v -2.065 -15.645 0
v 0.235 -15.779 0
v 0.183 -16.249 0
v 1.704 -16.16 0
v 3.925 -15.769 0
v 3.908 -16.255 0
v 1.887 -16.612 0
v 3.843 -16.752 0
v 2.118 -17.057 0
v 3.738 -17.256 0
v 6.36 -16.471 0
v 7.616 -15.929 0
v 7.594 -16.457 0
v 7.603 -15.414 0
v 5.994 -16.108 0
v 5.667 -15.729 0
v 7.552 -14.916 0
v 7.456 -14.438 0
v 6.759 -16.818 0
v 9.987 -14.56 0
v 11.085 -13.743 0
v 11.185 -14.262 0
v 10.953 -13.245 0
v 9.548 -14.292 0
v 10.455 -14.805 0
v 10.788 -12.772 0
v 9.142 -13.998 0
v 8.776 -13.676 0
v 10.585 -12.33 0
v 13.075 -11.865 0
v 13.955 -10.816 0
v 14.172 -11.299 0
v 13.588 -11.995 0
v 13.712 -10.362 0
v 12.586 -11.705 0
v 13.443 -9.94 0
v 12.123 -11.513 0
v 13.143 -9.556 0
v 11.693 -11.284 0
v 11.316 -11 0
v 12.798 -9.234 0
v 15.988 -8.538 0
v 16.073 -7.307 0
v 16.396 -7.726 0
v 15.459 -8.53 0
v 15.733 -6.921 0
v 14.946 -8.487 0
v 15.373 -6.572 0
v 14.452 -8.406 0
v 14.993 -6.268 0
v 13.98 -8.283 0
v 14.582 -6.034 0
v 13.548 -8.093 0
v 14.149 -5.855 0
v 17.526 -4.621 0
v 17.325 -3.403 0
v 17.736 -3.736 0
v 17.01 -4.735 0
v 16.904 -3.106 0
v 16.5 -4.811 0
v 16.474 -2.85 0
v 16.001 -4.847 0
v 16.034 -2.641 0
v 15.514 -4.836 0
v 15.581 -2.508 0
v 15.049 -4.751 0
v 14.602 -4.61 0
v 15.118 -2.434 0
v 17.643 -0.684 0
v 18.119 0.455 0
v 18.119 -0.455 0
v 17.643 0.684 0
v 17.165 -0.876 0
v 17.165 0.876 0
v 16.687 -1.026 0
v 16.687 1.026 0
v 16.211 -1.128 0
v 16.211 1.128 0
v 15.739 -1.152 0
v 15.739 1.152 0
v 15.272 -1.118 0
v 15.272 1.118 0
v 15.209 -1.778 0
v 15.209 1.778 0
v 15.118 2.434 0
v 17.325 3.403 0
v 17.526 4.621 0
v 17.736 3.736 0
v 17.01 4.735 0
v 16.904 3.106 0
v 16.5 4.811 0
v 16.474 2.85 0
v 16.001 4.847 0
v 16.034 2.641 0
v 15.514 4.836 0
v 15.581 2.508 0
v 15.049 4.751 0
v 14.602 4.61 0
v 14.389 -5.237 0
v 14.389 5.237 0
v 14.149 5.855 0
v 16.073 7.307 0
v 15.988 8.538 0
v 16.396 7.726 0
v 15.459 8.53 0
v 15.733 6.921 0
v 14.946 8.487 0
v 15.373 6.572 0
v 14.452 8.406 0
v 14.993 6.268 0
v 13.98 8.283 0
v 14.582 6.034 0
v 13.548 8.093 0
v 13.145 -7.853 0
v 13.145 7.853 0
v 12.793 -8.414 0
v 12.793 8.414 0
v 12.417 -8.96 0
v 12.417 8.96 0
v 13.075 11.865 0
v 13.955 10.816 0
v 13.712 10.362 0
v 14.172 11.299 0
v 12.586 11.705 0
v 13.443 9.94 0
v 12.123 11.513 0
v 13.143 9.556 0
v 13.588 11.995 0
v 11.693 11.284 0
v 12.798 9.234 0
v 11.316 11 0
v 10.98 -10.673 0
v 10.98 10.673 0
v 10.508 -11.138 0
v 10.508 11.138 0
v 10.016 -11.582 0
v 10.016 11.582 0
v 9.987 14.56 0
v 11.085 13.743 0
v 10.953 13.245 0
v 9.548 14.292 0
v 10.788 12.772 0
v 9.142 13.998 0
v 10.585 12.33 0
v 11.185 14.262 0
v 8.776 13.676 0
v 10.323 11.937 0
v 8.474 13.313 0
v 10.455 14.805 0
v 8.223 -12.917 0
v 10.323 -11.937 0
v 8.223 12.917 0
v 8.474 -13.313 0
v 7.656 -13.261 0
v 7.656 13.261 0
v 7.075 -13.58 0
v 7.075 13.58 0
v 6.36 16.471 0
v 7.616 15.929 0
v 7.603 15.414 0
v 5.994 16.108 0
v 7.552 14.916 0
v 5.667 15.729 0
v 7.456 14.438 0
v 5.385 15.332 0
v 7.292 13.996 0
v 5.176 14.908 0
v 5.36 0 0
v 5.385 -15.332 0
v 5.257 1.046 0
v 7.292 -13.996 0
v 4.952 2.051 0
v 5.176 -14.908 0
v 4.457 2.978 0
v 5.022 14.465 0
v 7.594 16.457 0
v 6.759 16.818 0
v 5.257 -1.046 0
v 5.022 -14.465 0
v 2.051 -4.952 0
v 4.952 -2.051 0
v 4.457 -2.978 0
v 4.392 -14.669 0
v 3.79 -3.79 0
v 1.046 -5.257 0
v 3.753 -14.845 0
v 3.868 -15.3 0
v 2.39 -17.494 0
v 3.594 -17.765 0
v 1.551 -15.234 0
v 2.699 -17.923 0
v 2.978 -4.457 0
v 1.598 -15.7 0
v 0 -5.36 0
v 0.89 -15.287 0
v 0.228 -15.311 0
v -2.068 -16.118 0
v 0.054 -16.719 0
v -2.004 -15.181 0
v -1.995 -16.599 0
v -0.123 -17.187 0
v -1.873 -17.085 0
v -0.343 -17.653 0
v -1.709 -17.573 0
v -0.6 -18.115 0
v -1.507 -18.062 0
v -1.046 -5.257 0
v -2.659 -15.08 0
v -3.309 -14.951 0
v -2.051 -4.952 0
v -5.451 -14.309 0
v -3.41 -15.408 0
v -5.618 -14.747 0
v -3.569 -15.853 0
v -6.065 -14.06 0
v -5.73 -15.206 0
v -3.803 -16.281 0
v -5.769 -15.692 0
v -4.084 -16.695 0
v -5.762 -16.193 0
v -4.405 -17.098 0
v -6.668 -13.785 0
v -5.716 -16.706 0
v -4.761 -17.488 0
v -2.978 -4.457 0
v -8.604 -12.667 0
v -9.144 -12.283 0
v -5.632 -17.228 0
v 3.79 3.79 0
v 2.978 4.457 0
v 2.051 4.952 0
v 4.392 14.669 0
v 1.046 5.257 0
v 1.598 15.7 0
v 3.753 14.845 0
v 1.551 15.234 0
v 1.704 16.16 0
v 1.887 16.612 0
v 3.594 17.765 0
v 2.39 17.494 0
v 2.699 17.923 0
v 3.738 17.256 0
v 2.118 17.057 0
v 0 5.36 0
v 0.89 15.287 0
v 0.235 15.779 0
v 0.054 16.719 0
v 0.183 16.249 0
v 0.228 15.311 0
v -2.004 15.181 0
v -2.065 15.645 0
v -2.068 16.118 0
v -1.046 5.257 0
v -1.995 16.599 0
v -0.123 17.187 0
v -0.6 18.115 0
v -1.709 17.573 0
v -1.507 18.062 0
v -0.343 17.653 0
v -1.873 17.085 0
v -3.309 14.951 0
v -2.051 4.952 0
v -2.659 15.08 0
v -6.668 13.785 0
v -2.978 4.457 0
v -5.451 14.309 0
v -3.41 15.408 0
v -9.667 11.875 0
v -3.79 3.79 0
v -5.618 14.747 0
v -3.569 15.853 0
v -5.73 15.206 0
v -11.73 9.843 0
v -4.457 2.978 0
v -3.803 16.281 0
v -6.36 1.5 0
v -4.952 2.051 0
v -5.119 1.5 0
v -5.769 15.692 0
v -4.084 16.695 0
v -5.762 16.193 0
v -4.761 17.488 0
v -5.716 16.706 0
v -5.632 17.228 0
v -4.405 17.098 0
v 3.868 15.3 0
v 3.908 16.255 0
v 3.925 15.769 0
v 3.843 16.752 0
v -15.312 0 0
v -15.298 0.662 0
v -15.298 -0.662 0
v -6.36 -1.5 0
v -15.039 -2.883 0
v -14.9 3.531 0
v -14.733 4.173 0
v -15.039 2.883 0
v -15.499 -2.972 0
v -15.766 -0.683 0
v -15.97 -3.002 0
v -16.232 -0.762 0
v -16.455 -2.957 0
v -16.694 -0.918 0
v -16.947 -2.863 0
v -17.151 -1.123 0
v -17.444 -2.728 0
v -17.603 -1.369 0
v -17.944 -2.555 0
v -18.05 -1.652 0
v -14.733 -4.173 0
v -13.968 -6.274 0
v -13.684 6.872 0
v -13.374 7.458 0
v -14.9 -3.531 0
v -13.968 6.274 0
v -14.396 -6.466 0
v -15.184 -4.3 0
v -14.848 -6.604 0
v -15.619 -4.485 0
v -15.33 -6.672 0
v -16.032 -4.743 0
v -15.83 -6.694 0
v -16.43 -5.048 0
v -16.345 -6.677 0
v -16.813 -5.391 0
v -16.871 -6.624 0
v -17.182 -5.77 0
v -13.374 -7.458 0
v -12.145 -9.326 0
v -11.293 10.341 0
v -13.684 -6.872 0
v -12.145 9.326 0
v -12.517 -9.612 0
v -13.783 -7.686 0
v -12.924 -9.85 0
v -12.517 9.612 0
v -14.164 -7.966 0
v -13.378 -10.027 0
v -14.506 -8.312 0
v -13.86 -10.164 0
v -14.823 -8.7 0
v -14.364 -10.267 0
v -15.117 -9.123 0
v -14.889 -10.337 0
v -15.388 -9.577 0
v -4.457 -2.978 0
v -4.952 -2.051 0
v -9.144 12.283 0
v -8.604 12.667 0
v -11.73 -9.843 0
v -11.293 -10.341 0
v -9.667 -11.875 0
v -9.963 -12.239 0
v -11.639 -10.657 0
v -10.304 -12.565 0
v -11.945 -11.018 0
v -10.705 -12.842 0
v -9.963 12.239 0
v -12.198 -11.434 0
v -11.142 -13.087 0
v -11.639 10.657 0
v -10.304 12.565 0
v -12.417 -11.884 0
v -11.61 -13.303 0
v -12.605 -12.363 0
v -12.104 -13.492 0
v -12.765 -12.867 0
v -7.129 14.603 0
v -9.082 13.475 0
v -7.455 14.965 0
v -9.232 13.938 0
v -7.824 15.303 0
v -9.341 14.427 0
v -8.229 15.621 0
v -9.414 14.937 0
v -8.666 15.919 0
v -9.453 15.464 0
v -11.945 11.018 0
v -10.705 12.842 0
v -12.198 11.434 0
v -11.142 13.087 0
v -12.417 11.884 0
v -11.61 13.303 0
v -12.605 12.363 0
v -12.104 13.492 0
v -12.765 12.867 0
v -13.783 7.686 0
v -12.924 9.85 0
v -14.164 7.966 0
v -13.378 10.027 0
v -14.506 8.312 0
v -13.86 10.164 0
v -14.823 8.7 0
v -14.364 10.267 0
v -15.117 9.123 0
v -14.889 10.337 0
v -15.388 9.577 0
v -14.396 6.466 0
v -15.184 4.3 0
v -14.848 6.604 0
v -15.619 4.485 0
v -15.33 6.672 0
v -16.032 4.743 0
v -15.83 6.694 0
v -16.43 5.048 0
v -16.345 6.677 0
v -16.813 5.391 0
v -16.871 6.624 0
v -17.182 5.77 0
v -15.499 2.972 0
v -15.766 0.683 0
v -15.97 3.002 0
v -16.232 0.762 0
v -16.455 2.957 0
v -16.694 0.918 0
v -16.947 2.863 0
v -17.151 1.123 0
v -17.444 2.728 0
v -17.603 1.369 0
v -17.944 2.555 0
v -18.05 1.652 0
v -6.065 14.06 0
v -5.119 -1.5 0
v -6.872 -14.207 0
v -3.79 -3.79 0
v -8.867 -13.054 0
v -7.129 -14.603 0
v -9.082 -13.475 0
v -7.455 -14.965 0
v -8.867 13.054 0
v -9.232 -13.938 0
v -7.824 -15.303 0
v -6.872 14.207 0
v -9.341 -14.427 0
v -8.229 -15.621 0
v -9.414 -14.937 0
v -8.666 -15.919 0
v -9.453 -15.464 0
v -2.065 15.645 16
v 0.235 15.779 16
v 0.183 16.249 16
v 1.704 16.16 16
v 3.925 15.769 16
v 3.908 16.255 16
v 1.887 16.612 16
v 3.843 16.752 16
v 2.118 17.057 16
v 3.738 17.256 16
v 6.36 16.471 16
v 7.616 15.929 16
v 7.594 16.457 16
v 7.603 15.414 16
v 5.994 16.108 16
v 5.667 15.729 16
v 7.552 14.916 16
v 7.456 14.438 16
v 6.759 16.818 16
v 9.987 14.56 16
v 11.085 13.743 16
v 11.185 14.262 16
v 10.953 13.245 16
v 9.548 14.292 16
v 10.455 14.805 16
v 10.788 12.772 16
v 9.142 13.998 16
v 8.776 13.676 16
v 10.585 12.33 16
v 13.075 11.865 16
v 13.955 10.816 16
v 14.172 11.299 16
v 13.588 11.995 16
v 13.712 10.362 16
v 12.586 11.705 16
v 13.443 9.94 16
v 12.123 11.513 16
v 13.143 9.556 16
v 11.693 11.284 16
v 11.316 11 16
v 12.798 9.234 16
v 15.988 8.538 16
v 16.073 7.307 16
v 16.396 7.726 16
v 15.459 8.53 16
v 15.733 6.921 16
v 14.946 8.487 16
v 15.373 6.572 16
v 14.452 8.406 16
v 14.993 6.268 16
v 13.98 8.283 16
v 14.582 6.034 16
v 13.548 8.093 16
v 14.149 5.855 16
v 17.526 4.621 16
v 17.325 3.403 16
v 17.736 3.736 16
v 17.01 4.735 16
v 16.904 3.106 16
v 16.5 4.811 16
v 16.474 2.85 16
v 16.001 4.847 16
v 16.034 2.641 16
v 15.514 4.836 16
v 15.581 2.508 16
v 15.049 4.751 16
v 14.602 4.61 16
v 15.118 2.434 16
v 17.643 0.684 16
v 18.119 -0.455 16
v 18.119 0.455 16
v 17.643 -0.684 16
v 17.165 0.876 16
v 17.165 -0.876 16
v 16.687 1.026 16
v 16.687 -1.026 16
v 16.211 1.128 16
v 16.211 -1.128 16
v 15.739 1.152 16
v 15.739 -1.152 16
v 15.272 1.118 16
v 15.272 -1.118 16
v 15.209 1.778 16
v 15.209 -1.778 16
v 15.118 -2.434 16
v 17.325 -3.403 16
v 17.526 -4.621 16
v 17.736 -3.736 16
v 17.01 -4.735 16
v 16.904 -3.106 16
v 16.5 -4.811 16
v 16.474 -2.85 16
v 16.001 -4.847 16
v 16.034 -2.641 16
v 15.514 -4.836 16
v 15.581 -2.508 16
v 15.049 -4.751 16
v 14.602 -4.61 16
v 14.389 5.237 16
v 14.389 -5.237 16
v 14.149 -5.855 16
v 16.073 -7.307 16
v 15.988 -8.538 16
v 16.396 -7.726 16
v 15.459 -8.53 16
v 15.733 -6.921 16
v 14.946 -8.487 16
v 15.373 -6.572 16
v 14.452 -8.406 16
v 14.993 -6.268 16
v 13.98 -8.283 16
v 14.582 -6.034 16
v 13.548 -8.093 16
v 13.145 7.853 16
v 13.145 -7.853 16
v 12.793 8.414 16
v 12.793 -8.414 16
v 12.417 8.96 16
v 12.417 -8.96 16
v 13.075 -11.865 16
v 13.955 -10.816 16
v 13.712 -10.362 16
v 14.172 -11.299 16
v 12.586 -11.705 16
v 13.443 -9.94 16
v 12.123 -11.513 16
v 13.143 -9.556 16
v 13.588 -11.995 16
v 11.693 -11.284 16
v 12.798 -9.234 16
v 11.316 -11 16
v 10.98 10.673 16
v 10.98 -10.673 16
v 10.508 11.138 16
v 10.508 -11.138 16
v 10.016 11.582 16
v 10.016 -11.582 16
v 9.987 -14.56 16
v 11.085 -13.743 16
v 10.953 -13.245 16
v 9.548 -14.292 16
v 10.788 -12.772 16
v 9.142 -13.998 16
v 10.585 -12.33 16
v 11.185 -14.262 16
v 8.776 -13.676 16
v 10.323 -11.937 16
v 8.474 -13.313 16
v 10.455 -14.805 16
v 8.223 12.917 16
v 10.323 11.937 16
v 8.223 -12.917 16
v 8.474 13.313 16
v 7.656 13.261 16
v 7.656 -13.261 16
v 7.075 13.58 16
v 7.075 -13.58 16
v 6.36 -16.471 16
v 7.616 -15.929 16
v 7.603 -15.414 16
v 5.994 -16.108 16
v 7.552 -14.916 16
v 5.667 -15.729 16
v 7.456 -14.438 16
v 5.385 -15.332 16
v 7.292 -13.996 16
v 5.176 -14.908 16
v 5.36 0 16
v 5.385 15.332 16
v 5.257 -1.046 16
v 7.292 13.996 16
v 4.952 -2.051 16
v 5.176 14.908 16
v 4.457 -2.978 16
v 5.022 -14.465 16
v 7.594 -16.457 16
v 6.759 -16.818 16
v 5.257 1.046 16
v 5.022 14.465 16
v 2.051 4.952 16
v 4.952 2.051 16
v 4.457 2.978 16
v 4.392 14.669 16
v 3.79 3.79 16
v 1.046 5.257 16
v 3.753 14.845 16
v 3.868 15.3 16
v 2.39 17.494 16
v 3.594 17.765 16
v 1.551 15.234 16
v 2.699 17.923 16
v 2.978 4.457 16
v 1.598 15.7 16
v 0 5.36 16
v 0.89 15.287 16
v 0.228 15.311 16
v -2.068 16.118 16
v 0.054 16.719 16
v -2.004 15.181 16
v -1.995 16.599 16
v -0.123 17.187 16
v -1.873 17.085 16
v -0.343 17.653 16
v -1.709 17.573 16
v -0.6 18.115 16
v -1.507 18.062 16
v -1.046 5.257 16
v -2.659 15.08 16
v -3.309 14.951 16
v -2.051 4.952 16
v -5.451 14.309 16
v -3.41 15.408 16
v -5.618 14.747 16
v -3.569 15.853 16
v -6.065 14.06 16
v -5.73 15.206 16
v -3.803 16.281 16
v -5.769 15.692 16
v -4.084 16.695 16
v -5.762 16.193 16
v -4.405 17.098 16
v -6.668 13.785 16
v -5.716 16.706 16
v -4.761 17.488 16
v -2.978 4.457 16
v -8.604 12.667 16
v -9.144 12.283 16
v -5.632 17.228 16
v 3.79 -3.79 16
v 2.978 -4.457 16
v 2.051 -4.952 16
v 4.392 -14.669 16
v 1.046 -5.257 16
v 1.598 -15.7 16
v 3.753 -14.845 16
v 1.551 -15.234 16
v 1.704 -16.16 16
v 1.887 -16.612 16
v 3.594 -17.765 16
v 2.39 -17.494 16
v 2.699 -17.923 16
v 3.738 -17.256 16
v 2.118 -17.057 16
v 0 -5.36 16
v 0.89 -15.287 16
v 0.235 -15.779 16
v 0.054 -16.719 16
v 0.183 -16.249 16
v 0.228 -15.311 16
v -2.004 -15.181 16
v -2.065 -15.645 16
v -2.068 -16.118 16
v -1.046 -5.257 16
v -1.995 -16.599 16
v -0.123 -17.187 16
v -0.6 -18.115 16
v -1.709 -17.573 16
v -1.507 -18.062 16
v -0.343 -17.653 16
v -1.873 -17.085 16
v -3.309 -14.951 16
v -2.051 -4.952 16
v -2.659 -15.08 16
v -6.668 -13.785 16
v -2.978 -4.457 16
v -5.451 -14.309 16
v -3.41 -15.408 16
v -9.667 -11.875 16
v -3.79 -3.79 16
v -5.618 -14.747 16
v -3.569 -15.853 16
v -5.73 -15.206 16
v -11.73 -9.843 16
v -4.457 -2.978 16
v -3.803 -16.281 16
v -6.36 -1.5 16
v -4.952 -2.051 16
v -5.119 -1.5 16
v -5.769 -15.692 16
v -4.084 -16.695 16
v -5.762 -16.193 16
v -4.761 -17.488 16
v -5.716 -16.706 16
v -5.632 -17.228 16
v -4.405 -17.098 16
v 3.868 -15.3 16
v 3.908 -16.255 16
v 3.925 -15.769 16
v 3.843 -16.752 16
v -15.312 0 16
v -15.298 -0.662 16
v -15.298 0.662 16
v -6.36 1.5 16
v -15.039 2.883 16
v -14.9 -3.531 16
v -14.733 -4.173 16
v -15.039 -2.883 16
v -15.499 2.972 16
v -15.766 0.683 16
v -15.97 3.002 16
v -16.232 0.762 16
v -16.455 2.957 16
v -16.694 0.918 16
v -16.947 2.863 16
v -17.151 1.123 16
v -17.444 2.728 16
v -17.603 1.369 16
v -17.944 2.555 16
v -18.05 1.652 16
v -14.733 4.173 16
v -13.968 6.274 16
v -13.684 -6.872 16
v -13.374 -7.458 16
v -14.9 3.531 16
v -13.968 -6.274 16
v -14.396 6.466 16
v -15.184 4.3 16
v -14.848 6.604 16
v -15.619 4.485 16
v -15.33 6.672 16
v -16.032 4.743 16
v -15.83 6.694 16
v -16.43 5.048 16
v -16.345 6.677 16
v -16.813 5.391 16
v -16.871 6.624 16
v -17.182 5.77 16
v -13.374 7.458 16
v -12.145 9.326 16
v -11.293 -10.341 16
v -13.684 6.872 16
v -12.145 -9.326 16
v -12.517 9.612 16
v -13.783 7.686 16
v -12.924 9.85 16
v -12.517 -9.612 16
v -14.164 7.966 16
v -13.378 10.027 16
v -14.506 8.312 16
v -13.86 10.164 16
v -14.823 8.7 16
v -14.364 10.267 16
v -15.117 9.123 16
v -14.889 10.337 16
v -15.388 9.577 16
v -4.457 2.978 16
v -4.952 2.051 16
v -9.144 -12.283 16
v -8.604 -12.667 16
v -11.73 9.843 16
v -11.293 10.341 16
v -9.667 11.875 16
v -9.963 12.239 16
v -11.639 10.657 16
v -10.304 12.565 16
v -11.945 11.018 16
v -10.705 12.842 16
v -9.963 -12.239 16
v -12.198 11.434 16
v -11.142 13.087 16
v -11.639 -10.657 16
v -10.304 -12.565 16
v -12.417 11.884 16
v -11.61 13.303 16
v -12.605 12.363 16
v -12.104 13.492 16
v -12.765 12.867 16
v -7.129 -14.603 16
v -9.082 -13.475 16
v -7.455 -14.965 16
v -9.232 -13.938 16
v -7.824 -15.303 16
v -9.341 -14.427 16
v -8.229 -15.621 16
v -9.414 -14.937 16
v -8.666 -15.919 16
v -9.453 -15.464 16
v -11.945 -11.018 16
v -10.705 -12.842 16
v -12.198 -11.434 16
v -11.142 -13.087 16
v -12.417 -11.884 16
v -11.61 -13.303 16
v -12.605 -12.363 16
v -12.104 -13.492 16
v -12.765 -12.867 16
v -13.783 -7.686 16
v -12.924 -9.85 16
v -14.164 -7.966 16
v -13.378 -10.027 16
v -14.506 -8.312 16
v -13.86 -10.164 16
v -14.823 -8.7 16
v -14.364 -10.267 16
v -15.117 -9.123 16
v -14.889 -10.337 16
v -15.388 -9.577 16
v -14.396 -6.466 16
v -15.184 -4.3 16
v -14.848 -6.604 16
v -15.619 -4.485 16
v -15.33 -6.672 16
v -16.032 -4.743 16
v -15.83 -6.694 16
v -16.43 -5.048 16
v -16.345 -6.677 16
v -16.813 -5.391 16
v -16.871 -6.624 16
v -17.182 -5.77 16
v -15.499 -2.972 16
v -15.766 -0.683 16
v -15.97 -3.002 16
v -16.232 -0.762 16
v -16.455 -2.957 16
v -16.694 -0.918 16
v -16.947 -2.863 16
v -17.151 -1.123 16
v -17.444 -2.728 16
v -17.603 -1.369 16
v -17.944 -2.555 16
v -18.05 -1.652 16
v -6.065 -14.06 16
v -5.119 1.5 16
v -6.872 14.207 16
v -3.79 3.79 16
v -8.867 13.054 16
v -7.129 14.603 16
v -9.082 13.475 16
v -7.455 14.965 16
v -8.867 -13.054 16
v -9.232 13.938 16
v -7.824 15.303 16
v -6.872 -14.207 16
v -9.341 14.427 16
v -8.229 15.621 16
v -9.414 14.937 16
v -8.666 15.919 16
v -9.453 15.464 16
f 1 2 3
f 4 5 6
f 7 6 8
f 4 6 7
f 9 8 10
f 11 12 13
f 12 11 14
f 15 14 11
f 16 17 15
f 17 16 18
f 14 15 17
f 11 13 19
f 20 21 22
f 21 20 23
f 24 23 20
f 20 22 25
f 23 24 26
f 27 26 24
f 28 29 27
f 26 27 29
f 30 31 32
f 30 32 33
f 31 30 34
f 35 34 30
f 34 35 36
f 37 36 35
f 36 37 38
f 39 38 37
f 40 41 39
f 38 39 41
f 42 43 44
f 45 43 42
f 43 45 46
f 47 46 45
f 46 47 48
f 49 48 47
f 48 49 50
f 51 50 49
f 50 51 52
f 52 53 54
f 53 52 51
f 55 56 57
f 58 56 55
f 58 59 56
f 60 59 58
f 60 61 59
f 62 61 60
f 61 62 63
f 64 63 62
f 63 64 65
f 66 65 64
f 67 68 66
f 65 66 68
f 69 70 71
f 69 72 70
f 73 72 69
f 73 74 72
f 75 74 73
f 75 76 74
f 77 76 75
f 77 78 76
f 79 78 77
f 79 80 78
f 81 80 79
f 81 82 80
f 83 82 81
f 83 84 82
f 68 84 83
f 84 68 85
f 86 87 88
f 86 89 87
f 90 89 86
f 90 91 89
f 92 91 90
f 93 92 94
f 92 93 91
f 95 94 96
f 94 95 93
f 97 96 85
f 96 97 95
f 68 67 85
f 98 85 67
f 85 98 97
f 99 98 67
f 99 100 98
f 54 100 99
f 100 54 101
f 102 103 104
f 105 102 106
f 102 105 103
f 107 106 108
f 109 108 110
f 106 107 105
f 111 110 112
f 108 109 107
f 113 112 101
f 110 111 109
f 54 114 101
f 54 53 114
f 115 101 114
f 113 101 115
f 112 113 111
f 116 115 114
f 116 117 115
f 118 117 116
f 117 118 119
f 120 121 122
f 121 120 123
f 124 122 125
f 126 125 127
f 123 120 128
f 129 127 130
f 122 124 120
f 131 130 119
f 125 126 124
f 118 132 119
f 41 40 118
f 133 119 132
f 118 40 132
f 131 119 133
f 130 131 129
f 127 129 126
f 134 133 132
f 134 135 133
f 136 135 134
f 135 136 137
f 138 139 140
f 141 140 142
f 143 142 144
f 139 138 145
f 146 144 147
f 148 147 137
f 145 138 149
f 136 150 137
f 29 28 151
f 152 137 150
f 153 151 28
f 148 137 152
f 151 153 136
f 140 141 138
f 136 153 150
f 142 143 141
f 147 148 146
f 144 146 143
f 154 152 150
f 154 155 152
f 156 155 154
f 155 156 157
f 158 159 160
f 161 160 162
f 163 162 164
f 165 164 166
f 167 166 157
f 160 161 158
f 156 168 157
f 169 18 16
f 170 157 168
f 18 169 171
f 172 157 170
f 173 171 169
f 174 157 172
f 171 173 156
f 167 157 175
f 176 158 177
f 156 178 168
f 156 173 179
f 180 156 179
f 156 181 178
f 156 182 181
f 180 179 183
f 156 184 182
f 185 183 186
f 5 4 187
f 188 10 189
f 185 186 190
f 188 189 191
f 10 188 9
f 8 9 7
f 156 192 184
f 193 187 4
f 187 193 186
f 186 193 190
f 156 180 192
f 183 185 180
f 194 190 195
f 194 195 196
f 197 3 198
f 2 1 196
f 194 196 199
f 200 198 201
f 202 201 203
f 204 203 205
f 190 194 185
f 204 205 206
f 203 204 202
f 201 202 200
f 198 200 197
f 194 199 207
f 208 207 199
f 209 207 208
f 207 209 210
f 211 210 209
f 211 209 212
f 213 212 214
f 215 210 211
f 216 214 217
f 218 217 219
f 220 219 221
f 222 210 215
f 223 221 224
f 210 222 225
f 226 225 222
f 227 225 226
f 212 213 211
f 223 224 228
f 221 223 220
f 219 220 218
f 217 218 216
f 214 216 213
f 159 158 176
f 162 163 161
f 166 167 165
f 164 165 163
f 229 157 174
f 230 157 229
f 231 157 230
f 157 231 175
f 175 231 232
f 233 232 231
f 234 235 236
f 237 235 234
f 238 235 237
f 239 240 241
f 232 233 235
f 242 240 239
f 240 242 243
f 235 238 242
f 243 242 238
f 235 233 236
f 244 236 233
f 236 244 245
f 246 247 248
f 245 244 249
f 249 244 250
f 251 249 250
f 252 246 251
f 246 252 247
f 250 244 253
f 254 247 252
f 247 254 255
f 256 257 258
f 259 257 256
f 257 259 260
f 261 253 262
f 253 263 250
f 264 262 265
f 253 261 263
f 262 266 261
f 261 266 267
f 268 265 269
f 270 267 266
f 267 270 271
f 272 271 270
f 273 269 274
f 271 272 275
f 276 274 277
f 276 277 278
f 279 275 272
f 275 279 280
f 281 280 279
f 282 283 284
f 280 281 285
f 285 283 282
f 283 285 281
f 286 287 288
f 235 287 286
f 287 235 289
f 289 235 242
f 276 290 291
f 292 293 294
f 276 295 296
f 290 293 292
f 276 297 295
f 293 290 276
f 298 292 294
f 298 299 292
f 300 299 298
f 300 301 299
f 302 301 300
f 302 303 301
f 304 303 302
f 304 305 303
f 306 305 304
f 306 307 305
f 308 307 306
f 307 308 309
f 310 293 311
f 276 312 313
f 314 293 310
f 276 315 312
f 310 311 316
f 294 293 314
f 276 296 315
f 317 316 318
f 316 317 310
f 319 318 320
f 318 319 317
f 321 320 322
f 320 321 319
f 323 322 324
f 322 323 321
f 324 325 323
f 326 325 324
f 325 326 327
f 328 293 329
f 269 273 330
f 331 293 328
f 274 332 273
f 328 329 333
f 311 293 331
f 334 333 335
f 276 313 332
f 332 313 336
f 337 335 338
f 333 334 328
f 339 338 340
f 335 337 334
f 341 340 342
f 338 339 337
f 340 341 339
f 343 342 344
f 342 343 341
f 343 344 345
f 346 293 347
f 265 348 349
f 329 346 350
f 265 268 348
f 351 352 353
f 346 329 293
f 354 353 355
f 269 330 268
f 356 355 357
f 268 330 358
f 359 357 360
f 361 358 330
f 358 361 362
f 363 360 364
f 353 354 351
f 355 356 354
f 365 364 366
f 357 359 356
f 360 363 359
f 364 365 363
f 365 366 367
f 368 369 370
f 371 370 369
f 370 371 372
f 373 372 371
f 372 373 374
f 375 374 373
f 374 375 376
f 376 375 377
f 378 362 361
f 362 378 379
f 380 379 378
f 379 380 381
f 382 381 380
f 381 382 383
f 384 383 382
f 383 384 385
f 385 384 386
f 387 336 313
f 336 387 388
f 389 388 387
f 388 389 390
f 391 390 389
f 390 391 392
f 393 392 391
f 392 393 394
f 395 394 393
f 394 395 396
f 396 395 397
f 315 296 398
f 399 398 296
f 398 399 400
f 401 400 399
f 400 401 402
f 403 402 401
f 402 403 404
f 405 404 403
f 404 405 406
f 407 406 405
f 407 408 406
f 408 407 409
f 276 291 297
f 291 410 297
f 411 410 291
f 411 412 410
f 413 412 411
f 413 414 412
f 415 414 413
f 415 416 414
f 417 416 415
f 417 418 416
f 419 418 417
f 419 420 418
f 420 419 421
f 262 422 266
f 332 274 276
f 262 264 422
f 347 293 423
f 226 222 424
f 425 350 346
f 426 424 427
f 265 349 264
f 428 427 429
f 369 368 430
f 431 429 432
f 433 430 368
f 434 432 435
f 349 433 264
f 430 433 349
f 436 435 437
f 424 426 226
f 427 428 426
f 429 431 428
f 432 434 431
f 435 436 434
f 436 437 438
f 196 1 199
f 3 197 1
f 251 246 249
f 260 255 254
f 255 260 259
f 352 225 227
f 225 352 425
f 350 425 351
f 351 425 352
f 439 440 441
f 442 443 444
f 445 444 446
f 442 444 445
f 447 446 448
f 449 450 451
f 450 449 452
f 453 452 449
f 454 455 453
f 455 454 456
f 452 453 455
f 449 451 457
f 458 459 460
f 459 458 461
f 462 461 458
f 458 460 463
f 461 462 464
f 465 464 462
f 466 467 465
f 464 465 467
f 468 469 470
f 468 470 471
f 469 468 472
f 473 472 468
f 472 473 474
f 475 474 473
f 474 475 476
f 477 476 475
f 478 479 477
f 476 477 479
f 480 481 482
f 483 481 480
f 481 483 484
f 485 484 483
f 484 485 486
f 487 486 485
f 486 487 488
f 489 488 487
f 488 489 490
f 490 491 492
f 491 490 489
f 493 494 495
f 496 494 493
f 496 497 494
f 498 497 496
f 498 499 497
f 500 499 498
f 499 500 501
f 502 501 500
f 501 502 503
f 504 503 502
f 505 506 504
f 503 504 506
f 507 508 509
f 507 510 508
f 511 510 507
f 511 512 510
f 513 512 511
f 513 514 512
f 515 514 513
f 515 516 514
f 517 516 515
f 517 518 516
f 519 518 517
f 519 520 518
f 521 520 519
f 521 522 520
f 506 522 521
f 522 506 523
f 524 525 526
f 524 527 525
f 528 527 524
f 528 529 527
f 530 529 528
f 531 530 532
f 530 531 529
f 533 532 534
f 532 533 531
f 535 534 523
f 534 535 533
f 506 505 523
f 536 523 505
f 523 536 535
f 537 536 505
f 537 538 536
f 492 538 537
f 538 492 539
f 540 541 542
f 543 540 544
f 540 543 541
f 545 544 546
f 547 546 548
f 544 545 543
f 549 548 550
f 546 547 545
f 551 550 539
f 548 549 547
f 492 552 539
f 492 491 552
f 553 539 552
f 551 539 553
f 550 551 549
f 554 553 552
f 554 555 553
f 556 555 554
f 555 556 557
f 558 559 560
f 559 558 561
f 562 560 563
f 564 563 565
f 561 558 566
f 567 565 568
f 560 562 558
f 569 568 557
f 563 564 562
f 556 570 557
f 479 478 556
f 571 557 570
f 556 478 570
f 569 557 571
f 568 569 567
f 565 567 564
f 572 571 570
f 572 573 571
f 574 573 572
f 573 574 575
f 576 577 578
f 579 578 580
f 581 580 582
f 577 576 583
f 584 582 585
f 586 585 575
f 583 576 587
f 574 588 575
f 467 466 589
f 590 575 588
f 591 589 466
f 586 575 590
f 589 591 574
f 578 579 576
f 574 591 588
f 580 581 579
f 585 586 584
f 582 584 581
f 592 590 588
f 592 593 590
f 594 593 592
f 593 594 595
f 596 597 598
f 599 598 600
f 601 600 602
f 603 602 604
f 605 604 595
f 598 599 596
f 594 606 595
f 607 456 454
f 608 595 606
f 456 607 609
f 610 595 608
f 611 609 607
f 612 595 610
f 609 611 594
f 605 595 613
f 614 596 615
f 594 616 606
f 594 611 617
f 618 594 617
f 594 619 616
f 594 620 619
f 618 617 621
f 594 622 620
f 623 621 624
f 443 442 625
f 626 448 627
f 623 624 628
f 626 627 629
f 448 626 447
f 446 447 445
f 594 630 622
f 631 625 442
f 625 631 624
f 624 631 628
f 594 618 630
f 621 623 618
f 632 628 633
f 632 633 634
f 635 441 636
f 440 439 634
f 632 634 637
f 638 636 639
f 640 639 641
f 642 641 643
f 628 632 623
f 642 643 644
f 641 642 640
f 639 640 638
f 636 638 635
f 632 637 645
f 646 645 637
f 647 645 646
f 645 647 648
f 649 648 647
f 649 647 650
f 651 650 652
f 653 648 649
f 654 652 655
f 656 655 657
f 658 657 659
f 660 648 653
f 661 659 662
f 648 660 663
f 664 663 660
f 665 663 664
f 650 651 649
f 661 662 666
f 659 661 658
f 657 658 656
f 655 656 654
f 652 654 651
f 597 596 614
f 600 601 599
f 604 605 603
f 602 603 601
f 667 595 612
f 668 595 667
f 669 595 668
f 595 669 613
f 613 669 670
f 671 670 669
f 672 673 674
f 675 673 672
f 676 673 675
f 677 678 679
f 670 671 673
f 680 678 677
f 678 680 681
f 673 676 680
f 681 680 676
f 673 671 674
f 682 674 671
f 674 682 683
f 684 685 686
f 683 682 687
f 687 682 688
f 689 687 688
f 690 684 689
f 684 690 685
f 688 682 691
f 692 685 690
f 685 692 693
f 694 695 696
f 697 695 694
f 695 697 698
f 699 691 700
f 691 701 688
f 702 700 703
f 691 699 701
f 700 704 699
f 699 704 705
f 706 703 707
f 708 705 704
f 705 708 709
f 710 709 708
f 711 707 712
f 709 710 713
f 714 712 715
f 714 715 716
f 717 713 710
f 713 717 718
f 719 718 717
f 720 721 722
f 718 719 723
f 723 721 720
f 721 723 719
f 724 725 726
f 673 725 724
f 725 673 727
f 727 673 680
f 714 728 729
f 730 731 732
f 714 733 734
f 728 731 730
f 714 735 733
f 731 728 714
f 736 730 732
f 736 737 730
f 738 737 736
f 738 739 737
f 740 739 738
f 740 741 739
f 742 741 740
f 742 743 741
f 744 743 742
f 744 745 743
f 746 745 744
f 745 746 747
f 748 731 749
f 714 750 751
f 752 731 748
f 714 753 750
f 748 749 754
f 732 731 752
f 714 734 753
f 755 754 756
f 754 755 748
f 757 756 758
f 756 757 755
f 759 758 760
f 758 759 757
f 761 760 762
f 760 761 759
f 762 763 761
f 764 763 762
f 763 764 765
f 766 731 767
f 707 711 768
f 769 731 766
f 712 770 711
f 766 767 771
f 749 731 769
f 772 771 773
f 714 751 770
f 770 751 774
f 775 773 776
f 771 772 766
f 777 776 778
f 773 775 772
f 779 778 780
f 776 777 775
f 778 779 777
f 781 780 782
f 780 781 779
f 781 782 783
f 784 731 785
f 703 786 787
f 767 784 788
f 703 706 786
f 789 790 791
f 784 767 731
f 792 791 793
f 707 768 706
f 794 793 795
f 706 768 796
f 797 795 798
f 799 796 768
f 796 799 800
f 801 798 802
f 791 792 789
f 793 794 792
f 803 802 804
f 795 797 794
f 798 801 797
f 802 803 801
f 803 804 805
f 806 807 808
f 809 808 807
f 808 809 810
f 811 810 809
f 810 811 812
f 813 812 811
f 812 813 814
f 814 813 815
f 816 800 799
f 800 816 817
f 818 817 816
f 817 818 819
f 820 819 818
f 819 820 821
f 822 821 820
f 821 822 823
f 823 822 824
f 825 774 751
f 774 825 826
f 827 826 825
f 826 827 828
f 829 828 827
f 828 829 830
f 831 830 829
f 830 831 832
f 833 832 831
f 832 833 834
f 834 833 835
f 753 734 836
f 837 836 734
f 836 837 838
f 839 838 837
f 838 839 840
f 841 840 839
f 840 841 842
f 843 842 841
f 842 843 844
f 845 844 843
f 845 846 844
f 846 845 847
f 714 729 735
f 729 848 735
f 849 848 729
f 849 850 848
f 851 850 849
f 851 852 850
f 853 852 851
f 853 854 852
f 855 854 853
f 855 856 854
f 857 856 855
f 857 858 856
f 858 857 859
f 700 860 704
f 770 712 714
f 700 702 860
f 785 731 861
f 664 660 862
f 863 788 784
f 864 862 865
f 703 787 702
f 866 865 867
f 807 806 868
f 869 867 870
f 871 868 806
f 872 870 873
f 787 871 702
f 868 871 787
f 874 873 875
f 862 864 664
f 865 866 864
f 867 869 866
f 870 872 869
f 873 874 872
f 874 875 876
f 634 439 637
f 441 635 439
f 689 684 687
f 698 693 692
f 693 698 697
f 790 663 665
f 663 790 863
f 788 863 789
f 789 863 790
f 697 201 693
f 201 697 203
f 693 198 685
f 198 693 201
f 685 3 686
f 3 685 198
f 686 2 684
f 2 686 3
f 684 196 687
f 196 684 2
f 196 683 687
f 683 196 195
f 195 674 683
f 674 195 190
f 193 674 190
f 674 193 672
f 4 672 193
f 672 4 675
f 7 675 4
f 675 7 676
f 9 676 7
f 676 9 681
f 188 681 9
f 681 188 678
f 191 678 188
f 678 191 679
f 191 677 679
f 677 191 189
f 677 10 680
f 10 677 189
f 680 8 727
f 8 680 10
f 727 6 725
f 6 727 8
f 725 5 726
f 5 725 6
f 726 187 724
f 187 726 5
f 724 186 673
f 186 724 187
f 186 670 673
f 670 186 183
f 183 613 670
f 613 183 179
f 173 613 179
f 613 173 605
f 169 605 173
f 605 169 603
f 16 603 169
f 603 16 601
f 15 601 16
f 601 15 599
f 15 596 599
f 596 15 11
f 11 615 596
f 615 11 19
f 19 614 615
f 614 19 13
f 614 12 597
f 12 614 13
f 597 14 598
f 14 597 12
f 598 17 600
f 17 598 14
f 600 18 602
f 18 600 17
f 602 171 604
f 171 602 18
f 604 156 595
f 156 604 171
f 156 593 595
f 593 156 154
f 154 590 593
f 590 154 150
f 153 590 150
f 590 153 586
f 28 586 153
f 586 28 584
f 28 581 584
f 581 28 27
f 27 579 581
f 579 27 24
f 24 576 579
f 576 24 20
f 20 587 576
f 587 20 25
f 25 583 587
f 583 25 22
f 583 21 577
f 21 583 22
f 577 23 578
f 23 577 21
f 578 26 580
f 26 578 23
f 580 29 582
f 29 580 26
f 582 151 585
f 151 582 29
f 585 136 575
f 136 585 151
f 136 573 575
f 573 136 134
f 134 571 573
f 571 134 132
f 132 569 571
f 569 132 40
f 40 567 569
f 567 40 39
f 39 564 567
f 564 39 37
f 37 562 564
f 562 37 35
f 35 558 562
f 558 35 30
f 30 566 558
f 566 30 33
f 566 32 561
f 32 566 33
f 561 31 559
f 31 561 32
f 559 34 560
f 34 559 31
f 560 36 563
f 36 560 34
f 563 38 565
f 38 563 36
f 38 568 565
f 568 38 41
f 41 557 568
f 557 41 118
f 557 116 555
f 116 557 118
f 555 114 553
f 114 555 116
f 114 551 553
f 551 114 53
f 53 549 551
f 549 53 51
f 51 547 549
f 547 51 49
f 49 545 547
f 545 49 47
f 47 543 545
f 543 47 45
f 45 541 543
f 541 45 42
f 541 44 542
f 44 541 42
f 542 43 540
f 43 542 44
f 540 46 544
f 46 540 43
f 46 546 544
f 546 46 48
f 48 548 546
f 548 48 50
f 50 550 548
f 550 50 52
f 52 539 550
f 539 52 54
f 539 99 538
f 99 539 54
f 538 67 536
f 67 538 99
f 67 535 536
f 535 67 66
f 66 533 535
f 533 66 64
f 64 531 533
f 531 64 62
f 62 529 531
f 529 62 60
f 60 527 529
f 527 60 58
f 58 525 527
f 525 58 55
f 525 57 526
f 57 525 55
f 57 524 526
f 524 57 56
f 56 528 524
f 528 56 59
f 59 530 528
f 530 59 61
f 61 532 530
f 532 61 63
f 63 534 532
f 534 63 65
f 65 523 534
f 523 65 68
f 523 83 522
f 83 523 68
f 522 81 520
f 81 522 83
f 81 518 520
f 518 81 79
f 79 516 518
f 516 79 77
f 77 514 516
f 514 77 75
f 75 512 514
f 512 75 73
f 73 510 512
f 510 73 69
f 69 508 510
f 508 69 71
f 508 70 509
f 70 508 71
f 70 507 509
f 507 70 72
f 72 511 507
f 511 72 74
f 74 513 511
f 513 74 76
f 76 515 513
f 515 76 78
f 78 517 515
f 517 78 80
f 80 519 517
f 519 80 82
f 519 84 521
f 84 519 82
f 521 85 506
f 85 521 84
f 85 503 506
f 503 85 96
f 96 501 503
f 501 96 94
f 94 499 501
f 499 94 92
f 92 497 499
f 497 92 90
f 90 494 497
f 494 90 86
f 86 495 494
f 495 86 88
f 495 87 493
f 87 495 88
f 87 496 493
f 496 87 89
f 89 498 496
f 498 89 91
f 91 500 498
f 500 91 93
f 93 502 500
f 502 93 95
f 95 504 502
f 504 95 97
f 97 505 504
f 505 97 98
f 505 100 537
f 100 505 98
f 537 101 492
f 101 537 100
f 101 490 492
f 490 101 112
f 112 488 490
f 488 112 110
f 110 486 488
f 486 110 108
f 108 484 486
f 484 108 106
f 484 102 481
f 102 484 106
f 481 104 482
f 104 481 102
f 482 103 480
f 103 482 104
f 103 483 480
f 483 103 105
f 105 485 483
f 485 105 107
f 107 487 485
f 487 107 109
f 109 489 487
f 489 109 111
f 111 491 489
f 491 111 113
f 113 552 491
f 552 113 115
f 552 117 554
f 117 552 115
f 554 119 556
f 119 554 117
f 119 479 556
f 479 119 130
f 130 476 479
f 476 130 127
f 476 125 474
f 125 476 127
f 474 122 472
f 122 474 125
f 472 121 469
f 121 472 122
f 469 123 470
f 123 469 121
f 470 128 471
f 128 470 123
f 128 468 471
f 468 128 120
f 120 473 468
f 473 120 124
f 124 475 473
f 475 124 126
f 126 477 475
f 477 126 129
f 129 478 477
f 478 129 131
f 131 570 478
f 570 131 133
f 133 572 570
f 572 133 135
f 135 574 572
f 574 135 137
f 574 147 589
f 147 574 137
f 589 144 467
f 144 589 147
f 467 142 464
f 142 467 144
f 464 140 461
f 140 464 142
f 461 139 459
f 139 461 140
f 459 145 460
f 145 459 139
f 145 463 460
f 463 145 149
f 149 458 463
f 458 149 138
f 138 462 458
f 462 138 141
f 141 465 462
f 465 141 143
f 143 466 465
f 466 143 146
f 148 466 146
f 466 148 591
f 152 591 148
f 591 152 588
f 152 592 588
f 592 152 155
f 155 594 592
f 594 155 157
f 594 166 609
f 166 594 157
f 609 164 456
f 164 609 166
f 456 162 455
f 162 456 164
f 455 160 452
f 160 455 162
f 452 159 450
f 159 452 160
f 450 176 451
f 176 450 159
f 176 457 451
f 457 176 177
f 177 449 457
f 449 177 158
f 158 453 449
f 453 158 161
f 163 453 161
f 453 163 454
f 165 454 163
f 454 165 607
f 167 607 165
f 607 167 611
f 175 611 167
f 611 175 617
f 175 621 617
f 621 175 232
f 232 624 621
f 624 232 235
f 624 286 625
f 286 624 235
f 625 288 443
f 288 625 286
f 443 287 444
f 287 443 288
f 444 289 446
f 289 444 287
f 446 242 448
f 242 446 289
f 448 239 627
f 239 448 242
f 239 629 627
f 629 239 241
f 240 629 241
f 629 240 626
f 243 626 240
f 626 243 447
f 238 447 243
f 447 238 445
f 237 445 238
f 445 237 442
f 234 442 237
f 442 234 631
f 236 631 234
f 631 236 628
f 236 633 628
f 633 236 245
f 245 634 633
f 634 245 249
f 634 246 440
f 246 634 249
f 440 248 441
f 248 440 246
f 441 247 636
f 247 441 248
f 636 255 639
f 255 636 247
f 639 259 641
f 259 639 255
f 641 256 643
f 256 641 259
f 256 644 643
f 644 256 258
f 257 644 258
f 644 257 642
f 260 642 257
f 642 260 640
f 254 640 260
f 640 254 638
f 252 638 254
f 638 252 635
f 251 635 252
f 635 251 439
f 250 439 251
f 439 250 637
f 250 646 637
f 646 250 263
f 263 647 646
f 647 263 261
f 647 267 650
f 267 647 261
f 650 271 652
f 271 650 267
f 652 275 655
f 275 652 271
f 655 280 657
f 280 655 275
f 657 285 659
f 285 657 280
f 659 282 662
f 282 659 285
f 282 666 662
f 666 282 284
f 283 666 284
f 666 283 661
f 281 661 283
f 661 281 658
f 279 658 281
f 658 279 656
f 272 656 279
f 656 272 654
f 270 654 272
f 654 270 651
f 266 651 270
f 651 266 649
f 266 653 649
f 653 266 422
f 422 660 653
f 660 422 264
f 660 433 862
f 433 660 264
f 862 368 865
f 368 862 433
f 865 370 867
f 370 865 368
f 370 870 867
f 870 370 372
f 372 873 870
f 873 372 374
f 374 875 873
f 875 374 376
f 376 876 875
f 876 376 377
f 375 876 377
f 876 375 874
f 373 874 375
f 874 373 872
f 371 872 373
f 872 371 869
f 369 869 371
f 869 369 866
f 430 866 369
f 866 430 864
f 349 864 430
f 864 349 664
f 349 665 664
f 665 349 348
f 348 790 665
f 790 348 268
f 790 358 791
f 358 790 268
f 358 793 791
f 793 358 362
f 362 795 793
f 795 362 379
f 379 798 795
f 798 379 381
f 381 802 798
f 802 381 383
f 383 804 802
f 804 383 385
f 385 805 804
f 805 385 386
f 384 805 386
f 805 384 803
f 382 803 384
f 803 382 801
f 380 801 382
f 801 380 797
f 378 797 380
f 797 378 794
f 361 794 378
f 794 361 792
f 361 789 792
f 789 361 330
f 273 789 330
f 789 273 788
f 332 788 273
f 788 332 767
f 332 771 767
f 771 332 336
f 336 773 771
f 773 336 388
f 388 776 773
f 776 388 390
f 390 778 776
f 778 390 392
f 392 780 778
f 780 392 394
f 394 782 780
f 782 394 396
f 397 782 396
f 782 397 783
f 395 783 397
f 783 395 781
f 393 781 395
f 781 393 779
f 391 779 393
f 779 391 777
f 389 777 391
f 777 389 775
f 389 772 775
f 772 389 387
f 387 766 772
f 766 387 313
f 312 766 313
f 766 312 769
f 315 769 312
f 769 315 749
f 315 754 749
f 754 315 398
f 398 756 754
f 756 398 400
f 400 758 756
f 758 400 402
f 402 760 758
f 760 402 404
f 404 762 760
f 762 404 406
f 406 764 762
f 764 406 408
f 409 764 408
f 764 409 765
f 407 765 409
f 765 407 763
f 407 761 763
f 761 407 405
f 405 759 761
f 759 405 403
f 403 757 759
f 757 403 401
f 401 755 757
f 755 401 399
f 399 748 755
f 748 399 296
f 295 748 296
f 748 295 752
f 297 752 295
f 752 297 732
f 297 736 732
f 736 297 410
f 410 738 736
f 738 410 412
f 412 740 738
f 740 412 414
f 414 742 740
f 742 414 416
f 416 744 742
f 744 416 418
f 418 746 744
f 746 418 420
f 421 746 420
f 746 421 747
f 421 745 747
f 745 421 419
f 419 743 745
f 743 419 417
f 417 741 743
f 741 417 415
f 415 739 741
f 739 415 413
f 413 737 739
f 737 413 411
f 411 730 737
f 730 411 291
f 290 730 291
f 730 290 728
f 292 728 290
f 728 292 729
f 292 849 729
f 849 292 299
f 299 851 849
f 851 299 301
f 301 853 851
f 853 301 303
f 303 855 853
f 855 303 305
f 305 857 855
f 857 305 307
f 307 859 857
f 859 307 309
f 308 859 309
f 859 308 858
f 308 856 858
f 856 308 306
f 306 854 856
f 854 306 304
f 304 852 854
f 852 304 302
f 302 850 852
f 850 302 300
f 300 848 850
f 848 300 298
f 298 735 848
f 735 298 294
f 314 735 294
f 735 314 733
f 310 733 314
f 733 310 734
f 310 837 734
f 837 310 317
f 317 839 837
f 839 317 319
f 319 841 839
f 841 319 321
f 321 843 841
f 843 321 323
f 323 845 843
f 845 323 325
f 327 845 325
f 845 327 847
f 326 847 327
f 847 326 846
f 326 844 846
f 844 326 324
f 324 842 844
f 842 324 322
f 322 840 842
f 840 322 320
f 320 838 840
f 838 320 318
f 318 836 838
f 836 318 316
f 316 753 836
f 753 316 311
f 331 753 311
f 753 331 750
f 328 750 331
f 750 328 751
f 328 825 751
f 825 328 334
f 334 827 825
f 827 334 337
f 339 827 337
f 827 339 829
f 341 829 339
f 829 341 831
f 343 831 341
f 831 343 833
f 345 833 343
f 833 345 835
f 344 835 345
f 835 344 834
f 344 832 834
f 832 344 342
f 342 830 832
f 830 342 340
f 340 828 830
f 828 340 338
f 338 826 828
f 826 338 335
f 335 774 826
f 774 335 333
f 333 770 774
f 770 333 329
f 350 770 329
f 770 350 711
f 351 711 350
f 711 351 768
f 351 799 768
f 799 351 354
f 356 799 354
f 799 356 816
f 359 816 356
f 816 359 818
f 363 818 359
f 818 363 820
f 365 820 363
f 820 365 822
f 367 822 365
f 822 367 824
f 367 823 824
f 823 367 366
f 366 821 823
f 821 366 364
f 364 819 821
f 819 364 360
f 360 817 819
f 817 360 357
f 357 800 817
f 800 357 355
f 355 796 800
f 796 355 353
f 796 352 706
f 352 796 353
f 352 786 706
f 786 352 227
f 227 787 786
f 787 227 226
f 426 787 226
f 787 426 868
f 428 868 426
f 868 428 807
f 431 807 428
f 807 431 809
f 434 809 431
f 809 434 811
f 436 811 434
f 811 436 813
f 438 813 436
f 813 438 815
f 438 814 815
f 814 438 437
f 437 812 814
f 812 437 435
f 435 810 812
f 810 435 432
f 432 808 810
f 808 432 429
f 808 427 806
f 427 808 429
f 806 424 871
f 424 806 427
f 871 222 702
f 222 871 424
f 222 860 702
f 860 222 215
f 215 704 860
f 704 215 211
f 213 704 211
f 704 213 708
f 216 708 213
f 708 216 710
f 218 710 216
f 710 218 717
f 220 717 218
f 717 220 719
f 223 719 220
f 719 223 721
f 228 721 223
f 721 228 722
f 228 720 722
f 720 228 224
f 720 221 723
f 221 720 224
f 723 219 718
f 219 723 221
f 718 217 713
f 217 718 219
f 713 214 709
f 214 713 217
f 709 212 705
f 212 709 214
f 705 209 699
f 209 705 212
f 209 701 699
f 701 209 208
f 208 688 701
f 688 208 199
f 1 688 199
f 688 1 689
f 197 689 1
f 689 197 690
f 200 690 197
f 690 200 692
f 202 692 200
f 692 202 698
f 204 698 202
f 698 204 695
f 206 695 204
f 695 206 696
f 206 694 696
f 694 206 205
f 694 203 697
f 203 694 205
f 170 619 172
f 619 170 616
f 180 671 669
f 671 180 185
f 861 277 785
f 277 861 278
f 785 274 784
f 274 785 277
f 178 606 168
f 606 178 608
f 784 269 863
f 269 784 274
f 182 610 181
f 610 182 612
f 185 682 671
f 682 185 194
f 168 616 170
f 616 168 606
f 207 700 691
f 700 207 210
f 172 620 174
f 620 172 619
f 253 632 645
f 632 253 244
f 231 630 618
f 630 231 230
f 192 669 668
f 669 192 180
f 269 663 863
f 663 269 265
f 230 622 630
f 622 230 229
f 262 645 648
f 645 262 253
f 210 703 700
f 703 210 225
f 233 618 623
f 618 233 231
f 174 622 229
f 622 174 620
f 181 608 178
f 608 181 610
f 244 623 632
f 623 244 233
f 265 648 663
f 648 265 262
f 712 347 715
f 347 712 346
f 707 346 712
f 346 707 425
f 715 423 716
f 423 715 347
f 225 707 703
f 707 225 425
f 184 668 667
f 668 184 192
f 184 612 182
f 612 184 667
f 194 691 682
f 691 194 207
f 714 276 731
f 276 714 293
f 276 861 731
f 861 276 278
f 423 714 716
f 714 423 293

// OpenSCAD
$fn = 32;

// ----------------------------------------------------------------------
// Spur gear: m=1.25 z=27, 36.25 mm tip diameter x 16 mm
// ----------------------------------------------------------------------

// --- parameters (mm) ---
gear_module = 1.25;       // module
tooth_count = 27;         // number of teeth
gear_w = 16;              // face width
pa = 20;                  // pressure angle, deg
bore = 10.72;             // shaft bore
key_w = 3;                // keyway width
key_h = 1.4;              // keyway depth

/* --- involute profile --- */
pitch_r = gear_module * tooth_count / 2;
base_r = pitch_r * cos(pa);
tip_r = pitch_r + gear_module;
root_r = pitch_r - 1.25 * gear_module;
flank_steps = 6;

function inv_deg(a) = (tan(a) - a * PI / 180) * 180 / PI;
function flank_r(i) = root_r + (tip_r - root_r) * i / flank_steps;
function half_angle(r) = 90 / tooth_count + inv_deg(pa) - inv_deg(acos(min(1, base_r / r)));
function tooth_pt(k, i, side) =
    let (r = flank_r(i), a = k * 360 / tooth_count + side * half_angle(r))
    [r * cos(a), r * sin(a)];

module tooth_profile() {
  polygon(points = [
    for (k = [0 : tooth_count - 1])
      each [
        for (i = [0 : flank_steps]) tooth_pt(k, i, -1),
        for (i = [flank_steps : -1 : 0]) tooth_pt(k, i, 1),
        let (ta = (k + 0.5) * 360 / tooth_count)
          [root_r * cos(ta), root_r * sin(ta)]
      ]
  ]);
}

module gear_disc() {
  linear_extrude(height = gear_w) tooth_profile();
}

difference() {
  gear_disc();
  translate([0, 0, -1]) cylinder(h = gear_w + 3, d = bore);
  /* keyway on the bore */
  translate([-bore / 2 - 1, -key_w / 2, -1]) cube([key_h + 1, key_w, gear_w + 3]);
}
